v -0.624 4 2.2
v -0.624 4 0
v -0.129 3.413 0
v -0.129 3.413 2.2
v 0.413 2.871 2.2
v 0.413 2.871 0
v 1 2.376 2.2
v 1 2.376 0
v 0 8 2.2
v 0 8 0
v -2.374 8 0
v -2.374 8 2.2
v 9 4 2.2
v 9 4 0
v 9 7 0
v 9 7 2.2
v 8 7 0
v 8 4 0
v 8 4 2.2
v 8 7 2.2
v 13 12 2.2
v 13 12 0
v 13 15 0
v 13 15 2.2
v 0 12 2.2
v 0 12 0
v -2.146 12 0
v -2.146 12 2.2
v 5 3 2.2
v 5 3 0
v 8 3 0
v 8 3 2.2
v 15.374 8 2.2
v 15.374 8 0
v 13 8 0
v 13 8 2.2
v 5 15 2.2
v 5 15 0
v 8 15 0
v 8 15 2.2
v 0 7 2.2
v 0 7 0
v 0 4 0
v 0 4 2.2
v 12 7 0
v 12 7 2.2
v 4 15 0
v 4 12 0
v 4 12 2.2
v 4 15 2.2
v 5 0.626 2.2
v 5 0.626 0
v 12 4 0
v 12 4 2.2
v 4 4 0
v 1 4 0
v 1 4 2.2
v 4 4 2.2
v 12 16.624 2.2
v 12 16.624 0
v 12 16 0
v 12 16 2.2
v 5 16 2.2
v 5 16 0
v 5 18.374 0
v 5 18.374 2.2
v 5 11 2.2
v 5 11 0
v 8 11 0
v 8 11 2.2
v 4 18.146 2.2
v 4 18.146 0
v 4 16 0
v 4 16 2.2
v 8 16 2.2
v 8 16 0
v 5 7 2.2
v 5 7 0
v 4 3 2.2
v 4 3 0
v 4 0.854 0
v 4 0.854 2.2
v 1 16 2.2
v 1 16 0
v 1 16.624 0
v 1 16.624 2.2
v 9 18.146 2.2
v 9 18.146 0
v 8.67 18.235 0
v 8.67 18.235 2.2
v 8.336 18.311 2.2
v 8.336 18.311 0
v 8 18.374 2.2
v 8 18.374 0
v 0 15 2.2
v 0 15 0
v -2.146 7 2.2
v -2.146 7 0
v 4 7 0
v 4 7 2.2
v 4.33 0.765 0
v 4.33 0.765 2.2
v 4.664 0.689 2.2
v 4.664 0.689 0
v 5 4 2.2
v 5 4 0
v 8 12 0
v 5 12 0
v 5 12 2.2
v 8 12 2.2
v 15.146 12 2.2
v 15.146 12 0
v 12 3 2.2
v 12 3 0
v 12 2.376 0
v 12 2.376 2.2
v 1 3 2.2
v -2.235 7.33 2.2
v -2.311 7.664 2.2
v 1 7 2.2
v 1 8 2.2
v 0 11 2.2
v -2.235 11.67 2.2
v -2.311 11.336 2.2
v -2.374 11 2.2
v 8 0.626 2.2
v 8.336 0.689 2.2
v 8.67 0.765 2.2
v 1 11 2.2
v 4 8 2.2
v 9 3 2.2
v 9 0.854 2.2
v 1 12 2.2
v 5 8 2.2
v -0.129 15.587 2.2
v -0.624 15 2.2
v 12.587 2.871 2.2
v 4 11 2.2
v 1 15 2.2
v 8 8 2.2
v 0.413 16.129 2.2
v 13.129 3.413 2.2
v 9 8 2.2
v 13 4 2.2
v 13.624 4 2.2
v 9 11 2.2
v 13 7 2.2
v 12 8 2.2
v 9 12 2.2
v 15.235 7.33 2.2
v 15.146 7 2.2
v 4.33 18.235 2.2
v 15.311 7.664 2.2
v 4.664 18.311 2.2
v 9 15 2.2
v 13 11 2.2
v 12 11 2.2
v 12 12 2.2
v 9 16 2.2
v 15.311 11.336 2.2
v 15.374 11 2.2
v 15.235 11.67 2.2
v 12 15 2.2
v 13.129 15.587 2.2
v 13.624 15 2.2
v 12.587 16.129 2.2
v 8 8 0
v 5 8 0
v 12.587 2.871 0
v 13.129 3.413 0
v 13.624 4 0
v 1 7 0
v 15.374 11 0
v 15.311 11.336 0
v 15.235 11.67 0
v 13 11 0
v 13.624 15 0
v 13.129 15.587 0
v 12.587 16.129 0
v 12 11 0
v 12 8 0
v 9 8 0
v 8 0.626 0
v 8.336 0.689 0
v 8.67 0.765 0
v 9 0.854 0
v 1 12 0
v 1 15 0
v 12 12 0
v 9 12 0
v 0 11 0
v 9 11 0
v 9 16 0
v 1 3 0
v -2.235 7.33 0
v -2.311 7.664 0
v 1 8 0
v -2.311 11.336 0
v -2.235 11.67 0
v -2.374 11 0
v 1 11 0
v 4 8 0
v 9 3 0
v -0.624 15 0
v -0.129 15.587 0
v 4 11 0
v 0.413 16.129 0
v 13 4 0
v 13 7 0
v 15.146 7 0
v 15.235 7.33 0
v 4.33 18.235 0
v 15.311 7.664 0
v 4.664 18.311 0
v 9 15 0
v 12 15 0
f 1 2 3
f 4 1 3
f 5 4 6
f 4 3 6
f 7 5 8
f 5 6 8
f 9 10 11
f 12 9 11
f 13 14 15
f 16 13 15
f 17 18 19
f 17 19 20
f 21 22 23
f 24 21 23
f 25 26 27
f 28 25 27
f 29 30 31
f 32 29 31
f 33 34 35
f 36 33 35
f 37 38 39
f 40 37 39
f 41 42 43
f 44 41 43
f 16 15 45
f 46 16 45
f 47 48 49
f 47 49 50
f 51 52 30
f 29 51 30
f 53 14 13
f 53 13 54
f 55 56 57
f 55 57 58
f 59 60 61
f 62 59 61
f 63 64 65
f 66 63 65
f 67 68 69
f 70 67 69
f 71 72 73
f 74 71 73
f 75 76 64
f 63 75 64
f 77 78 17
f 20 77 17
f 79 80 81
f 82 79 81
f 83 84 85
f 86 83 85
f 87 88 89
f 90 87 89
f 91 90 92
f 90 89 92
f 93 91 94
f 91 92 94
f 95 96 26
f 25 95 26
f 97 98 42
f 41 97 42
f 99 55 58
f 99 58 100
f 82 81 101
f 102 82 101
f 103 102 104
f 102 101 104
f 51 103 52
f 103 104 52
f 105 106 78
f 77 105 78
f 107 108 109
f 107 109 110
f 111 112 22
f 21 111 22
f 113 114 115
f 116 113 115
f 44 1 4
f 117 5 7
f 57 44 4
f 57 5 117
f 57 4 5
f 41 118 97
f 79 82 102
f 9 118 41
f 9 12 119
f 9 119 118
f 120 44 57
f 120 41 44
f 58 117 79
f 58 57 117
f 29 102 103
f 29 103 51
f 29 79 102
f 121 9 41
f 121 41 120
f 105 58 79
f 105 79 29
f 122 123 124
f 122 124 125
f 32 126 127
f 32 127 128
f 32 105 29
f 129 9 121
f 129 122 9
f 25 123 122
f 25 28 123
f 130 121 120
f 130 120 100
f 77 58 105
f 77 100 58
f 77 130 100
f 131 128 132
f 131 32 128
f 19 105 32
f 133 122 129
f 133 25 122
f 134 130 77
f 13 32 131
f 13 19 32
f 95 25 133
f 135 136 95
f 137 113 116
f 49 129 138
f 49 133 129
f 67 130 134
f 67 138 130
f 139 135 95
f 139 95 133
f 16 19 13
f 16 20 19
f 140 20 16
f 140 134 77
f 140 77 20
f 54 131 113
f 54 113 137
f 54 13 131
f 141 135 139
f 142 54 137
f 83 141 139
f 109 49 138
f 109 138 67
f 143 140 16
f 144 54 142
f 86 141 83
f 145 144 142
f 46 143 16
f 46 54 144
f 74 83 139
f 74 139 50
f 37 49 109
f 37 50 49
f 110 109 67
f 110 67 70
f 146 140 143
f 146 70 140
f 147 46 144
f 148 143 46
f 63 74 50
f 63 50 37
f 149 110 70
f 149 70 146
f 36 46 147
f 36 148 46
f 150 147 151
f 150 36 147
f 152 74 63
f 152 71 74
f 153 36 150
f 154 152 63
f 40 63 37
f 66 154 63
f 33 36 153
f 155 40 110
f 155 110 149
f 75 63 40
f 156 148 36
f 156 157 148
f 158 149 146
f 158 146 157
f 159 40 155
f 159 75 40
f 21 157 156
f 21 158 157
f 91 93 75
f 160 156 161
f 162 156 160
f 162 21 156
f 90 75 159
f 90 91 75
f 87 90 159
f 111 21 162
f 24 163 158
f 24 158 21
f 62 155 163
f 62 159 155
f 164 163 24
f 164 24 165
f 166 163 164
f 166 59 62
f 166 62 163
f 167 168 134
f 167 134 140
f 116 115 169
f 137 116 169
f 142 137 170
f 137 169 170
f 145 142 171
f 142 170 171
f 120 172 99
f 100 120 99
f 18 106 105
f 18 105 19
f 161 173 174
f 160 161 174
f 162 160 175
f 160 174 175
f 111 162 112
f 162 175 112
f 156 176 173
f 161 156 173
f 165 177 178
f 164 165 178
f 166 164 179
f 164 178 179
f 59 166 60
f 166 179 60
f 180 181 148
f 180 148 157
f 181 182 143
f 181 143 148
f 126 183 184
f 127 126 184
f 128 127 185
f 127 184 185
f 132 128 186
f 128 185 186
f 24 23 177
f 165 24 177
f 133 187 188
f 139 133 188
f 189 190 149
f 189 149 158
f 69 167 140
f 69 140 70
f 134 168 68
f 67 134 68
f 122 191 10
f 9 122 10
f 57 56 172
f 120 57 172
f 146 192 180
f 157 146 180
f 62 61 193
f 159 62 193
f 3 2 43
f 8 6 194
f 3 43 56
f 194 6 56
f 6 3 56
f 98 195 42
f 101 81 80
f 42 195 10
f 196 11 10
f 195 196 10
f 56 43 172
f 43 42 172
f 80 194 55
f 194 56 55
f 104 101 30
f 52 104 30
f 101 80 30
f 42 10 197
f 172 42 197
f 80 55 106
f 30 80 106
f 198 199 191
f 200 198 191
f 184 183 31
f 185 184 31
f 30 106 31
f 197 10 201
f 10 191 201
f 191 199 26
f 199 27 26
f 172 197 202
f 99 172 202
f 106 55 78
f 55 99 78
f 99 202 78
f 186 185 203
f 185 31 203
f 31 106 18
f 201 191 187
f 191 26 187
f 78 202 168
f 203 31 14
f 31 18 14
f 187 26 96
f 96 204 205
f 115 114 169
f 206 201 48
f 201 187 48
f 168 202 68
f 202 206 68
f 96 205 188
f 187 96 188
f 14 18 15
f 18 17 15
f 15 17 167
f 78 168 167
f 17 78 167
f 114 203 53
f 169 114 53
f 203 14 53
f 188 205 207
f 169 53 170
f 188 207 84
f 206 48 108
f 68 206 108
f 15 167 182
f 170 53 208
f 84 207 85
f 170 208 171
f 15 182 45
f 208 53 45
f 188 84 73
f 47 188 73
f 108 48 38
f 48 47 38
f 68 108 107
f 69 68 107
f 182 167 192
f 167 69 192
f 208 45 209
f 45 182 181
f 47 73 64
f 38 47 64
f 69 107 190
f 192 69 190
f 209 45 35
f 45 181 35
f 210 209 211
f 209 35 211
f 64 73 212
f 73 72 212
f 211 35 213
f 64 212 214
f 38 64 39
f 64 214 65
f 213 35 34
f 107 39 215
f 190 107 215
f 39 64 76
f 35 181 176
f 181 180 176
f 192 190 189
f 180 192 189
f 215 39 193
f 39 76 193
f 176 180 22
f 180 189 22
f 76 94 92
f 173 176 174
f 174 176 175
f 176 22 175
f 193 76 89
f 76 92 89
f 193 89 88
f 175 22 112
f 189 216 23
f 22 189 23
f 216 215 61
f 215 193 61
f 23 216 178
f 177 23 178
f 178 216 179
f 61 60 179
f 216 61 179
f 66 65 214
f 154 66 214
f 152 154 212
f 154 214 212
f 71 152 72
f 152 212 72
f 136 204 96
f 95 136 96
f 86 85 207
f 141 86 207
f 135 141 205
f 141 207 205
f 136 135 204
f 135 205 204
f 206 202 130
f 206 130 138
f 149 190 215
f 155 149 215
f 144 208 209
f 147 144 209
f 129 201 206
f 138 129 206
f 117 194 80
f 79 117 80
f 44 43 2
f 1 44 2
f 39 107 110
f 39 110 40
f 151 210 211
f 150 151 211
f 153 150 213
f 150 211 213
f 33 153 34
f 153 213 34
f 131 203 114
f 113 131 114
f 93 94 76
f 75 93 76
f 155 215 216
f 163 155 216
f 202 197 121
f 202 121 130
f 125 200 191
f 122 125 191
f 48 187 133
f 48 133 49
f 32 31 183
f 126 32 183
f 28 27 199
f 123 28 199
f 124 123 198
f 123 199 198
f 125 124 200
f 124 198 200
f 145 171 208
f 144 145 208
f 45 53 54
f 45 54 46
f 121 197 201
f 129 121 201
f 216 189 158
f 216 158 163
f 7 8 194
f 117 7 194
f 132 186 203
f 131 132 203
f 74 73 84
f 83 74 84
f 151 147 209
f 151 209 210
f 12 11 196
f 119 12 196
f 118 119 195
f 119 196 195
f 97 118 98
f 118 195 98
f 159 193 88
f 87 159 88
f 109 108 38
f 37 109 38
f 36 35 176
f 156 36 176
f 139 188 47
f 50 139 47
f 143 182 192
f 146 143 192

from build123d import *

# Parameters (mm, degrees)
F0_W     = 3
F0_H     = 3
F1_DEPTH = 2.2


with BuildPart() as f1:
    # F0 (on Top) → F1 (new body)
    with BuildSketch(Plane.XY):
        with BuildLine():
            Line((1, 3), (4, 3))
            Line((4, 3), (4, 0.854192))
            ThreePointArc((4, 0.854192), (4.496745, 0.725778), (5, 0.62588))
            Line((5, 0.62588), (5, 3))
            Line((5, 3), (8, 3))
            Line((8, 3), (8, 0.62588))
            ThreePointArc((8, 0.62588), (8.503255, 0.725778), (9, 0.854192))
            Line((9, 0.854192), (9, 3))
            Line((9, 3), (12, 3))
            Line((12, 3), (12, 2.376097))
            ThreePointArc((12, 2.376097), (12.863961, 3.136039), (13.623903, 4))
            Line((13.623903, 4), (13, 4))
            Line((13, 4), (13, 7))
            Line((13, 7), (15.145808, 7))
            ThreePointArc((15.145808, 7), (15.274222, 7.496745), (15.37412, 8))
            Line((15.37412, 8), (13, 8))
            Line((13, 8), (13, 11))
            Line((13, 11), (15.37412, 11))
            ThreePointArc((15.37412, 11), (15.274222, 11.503255), (15.145808, 12))
            Line((15.145808, 12), (13, 12))
            Line((13, 12), (13, 15))
            Line((13, 15), (13.623903, 15))
            ThreePointArc((13.623903, 15), (12.863961, 15.863961), (12, 16.623903))
            Line((12, 16.623903), (12, 16))
            Line((12, 16), (9, 16))
            Line((9, 16), (9, 18.145808))
            ThreePointArc((9, 18.145808), (8.503255, 18.274222), (8, 18.37412))
            Line((8, 18.37412), (8, 16))
            Line((8, 16), (5, 16))
            Line((5, 16), (5, 18.37412))
            ThreePointArc((5, 18.37412), (4.496745, 18.274222), (4, 18.145808))
            Line((4, 18.145808), (4, 16))
            Line((4, 16), (1, 16))
            Line((1, 16), (1, 16.623903))
            ThreePointArc((1, 16.623903), (0.136039, 15.863961), (-0.623903, 15))
            Line((-0.623903, 15), (0, 15))
            Line((0, 15), (0, 12))
            Line((0, 12), (-2.145808, 12))
            ThreePointArc((-2.145808, 12), (-2.274222, 11.503255), (-2.37412, 11))
            Line((-2.37412, 11), (0, 11))
            Line((0, 11), (0, 8))
            Line((0, 8), (-2.37412, 8))
            ThreePointArc((-2.37412, 8), (-2.274222, 7.496745), (-2.145808, 7))
            Line((-2.145808, 7), (0, 7))
            Line((0, 7), (0, 4))
            Line((0, 4), (-0.623903, 4))
            ThreePointArc((-0.623903, 4), (0.136039, 3.136039), (1, 2.376097))
            Line((1, 2.376097), (1, 3))
        make_face()
        with Locations((2.5, 5.5)):
            Rectangle(F0_W, F0_H, mode=Mode.SUBTRACT)
        with Locations((6.5, 5.5)):
            Rectangle(F0_W, F0_H, mode=Mode.SUBTRACT)
        with Locations((10.5, 5.5)):
            Rectangle(F0_W, F0_H, mode=Mode.SUBTRACT)
        with Locations((2.5, 9.5)):
            Rectangle(F0_W, F0_H, mode=Mode.SUBTRACT)
        with Locations((2.5, 13.5)):
            Rectangle(F0_W, F0_H, mode=Mode.SUBTRACT)
        with Locations((6.5, 9.5)):
            Rectangle(F0_W, F0_H, mode=Mode.SUBTRACT)
        with Locations((10.5, 9.5)):
            Rectangle(F0_W, F0_H, mode=Mode.SUBTRACT)
        with Locations((6.5, 13.5)):
            Rectangle(F0_W, F0_H, mode=Mode.SUBTRACT)
        with Locations((10.5, 13.5)):
            Rectangle(F0_W, F0_H, mode=Mode.SUBTRACT)
    extrude(amount=F1_DEPTH)


solid = f1.part
